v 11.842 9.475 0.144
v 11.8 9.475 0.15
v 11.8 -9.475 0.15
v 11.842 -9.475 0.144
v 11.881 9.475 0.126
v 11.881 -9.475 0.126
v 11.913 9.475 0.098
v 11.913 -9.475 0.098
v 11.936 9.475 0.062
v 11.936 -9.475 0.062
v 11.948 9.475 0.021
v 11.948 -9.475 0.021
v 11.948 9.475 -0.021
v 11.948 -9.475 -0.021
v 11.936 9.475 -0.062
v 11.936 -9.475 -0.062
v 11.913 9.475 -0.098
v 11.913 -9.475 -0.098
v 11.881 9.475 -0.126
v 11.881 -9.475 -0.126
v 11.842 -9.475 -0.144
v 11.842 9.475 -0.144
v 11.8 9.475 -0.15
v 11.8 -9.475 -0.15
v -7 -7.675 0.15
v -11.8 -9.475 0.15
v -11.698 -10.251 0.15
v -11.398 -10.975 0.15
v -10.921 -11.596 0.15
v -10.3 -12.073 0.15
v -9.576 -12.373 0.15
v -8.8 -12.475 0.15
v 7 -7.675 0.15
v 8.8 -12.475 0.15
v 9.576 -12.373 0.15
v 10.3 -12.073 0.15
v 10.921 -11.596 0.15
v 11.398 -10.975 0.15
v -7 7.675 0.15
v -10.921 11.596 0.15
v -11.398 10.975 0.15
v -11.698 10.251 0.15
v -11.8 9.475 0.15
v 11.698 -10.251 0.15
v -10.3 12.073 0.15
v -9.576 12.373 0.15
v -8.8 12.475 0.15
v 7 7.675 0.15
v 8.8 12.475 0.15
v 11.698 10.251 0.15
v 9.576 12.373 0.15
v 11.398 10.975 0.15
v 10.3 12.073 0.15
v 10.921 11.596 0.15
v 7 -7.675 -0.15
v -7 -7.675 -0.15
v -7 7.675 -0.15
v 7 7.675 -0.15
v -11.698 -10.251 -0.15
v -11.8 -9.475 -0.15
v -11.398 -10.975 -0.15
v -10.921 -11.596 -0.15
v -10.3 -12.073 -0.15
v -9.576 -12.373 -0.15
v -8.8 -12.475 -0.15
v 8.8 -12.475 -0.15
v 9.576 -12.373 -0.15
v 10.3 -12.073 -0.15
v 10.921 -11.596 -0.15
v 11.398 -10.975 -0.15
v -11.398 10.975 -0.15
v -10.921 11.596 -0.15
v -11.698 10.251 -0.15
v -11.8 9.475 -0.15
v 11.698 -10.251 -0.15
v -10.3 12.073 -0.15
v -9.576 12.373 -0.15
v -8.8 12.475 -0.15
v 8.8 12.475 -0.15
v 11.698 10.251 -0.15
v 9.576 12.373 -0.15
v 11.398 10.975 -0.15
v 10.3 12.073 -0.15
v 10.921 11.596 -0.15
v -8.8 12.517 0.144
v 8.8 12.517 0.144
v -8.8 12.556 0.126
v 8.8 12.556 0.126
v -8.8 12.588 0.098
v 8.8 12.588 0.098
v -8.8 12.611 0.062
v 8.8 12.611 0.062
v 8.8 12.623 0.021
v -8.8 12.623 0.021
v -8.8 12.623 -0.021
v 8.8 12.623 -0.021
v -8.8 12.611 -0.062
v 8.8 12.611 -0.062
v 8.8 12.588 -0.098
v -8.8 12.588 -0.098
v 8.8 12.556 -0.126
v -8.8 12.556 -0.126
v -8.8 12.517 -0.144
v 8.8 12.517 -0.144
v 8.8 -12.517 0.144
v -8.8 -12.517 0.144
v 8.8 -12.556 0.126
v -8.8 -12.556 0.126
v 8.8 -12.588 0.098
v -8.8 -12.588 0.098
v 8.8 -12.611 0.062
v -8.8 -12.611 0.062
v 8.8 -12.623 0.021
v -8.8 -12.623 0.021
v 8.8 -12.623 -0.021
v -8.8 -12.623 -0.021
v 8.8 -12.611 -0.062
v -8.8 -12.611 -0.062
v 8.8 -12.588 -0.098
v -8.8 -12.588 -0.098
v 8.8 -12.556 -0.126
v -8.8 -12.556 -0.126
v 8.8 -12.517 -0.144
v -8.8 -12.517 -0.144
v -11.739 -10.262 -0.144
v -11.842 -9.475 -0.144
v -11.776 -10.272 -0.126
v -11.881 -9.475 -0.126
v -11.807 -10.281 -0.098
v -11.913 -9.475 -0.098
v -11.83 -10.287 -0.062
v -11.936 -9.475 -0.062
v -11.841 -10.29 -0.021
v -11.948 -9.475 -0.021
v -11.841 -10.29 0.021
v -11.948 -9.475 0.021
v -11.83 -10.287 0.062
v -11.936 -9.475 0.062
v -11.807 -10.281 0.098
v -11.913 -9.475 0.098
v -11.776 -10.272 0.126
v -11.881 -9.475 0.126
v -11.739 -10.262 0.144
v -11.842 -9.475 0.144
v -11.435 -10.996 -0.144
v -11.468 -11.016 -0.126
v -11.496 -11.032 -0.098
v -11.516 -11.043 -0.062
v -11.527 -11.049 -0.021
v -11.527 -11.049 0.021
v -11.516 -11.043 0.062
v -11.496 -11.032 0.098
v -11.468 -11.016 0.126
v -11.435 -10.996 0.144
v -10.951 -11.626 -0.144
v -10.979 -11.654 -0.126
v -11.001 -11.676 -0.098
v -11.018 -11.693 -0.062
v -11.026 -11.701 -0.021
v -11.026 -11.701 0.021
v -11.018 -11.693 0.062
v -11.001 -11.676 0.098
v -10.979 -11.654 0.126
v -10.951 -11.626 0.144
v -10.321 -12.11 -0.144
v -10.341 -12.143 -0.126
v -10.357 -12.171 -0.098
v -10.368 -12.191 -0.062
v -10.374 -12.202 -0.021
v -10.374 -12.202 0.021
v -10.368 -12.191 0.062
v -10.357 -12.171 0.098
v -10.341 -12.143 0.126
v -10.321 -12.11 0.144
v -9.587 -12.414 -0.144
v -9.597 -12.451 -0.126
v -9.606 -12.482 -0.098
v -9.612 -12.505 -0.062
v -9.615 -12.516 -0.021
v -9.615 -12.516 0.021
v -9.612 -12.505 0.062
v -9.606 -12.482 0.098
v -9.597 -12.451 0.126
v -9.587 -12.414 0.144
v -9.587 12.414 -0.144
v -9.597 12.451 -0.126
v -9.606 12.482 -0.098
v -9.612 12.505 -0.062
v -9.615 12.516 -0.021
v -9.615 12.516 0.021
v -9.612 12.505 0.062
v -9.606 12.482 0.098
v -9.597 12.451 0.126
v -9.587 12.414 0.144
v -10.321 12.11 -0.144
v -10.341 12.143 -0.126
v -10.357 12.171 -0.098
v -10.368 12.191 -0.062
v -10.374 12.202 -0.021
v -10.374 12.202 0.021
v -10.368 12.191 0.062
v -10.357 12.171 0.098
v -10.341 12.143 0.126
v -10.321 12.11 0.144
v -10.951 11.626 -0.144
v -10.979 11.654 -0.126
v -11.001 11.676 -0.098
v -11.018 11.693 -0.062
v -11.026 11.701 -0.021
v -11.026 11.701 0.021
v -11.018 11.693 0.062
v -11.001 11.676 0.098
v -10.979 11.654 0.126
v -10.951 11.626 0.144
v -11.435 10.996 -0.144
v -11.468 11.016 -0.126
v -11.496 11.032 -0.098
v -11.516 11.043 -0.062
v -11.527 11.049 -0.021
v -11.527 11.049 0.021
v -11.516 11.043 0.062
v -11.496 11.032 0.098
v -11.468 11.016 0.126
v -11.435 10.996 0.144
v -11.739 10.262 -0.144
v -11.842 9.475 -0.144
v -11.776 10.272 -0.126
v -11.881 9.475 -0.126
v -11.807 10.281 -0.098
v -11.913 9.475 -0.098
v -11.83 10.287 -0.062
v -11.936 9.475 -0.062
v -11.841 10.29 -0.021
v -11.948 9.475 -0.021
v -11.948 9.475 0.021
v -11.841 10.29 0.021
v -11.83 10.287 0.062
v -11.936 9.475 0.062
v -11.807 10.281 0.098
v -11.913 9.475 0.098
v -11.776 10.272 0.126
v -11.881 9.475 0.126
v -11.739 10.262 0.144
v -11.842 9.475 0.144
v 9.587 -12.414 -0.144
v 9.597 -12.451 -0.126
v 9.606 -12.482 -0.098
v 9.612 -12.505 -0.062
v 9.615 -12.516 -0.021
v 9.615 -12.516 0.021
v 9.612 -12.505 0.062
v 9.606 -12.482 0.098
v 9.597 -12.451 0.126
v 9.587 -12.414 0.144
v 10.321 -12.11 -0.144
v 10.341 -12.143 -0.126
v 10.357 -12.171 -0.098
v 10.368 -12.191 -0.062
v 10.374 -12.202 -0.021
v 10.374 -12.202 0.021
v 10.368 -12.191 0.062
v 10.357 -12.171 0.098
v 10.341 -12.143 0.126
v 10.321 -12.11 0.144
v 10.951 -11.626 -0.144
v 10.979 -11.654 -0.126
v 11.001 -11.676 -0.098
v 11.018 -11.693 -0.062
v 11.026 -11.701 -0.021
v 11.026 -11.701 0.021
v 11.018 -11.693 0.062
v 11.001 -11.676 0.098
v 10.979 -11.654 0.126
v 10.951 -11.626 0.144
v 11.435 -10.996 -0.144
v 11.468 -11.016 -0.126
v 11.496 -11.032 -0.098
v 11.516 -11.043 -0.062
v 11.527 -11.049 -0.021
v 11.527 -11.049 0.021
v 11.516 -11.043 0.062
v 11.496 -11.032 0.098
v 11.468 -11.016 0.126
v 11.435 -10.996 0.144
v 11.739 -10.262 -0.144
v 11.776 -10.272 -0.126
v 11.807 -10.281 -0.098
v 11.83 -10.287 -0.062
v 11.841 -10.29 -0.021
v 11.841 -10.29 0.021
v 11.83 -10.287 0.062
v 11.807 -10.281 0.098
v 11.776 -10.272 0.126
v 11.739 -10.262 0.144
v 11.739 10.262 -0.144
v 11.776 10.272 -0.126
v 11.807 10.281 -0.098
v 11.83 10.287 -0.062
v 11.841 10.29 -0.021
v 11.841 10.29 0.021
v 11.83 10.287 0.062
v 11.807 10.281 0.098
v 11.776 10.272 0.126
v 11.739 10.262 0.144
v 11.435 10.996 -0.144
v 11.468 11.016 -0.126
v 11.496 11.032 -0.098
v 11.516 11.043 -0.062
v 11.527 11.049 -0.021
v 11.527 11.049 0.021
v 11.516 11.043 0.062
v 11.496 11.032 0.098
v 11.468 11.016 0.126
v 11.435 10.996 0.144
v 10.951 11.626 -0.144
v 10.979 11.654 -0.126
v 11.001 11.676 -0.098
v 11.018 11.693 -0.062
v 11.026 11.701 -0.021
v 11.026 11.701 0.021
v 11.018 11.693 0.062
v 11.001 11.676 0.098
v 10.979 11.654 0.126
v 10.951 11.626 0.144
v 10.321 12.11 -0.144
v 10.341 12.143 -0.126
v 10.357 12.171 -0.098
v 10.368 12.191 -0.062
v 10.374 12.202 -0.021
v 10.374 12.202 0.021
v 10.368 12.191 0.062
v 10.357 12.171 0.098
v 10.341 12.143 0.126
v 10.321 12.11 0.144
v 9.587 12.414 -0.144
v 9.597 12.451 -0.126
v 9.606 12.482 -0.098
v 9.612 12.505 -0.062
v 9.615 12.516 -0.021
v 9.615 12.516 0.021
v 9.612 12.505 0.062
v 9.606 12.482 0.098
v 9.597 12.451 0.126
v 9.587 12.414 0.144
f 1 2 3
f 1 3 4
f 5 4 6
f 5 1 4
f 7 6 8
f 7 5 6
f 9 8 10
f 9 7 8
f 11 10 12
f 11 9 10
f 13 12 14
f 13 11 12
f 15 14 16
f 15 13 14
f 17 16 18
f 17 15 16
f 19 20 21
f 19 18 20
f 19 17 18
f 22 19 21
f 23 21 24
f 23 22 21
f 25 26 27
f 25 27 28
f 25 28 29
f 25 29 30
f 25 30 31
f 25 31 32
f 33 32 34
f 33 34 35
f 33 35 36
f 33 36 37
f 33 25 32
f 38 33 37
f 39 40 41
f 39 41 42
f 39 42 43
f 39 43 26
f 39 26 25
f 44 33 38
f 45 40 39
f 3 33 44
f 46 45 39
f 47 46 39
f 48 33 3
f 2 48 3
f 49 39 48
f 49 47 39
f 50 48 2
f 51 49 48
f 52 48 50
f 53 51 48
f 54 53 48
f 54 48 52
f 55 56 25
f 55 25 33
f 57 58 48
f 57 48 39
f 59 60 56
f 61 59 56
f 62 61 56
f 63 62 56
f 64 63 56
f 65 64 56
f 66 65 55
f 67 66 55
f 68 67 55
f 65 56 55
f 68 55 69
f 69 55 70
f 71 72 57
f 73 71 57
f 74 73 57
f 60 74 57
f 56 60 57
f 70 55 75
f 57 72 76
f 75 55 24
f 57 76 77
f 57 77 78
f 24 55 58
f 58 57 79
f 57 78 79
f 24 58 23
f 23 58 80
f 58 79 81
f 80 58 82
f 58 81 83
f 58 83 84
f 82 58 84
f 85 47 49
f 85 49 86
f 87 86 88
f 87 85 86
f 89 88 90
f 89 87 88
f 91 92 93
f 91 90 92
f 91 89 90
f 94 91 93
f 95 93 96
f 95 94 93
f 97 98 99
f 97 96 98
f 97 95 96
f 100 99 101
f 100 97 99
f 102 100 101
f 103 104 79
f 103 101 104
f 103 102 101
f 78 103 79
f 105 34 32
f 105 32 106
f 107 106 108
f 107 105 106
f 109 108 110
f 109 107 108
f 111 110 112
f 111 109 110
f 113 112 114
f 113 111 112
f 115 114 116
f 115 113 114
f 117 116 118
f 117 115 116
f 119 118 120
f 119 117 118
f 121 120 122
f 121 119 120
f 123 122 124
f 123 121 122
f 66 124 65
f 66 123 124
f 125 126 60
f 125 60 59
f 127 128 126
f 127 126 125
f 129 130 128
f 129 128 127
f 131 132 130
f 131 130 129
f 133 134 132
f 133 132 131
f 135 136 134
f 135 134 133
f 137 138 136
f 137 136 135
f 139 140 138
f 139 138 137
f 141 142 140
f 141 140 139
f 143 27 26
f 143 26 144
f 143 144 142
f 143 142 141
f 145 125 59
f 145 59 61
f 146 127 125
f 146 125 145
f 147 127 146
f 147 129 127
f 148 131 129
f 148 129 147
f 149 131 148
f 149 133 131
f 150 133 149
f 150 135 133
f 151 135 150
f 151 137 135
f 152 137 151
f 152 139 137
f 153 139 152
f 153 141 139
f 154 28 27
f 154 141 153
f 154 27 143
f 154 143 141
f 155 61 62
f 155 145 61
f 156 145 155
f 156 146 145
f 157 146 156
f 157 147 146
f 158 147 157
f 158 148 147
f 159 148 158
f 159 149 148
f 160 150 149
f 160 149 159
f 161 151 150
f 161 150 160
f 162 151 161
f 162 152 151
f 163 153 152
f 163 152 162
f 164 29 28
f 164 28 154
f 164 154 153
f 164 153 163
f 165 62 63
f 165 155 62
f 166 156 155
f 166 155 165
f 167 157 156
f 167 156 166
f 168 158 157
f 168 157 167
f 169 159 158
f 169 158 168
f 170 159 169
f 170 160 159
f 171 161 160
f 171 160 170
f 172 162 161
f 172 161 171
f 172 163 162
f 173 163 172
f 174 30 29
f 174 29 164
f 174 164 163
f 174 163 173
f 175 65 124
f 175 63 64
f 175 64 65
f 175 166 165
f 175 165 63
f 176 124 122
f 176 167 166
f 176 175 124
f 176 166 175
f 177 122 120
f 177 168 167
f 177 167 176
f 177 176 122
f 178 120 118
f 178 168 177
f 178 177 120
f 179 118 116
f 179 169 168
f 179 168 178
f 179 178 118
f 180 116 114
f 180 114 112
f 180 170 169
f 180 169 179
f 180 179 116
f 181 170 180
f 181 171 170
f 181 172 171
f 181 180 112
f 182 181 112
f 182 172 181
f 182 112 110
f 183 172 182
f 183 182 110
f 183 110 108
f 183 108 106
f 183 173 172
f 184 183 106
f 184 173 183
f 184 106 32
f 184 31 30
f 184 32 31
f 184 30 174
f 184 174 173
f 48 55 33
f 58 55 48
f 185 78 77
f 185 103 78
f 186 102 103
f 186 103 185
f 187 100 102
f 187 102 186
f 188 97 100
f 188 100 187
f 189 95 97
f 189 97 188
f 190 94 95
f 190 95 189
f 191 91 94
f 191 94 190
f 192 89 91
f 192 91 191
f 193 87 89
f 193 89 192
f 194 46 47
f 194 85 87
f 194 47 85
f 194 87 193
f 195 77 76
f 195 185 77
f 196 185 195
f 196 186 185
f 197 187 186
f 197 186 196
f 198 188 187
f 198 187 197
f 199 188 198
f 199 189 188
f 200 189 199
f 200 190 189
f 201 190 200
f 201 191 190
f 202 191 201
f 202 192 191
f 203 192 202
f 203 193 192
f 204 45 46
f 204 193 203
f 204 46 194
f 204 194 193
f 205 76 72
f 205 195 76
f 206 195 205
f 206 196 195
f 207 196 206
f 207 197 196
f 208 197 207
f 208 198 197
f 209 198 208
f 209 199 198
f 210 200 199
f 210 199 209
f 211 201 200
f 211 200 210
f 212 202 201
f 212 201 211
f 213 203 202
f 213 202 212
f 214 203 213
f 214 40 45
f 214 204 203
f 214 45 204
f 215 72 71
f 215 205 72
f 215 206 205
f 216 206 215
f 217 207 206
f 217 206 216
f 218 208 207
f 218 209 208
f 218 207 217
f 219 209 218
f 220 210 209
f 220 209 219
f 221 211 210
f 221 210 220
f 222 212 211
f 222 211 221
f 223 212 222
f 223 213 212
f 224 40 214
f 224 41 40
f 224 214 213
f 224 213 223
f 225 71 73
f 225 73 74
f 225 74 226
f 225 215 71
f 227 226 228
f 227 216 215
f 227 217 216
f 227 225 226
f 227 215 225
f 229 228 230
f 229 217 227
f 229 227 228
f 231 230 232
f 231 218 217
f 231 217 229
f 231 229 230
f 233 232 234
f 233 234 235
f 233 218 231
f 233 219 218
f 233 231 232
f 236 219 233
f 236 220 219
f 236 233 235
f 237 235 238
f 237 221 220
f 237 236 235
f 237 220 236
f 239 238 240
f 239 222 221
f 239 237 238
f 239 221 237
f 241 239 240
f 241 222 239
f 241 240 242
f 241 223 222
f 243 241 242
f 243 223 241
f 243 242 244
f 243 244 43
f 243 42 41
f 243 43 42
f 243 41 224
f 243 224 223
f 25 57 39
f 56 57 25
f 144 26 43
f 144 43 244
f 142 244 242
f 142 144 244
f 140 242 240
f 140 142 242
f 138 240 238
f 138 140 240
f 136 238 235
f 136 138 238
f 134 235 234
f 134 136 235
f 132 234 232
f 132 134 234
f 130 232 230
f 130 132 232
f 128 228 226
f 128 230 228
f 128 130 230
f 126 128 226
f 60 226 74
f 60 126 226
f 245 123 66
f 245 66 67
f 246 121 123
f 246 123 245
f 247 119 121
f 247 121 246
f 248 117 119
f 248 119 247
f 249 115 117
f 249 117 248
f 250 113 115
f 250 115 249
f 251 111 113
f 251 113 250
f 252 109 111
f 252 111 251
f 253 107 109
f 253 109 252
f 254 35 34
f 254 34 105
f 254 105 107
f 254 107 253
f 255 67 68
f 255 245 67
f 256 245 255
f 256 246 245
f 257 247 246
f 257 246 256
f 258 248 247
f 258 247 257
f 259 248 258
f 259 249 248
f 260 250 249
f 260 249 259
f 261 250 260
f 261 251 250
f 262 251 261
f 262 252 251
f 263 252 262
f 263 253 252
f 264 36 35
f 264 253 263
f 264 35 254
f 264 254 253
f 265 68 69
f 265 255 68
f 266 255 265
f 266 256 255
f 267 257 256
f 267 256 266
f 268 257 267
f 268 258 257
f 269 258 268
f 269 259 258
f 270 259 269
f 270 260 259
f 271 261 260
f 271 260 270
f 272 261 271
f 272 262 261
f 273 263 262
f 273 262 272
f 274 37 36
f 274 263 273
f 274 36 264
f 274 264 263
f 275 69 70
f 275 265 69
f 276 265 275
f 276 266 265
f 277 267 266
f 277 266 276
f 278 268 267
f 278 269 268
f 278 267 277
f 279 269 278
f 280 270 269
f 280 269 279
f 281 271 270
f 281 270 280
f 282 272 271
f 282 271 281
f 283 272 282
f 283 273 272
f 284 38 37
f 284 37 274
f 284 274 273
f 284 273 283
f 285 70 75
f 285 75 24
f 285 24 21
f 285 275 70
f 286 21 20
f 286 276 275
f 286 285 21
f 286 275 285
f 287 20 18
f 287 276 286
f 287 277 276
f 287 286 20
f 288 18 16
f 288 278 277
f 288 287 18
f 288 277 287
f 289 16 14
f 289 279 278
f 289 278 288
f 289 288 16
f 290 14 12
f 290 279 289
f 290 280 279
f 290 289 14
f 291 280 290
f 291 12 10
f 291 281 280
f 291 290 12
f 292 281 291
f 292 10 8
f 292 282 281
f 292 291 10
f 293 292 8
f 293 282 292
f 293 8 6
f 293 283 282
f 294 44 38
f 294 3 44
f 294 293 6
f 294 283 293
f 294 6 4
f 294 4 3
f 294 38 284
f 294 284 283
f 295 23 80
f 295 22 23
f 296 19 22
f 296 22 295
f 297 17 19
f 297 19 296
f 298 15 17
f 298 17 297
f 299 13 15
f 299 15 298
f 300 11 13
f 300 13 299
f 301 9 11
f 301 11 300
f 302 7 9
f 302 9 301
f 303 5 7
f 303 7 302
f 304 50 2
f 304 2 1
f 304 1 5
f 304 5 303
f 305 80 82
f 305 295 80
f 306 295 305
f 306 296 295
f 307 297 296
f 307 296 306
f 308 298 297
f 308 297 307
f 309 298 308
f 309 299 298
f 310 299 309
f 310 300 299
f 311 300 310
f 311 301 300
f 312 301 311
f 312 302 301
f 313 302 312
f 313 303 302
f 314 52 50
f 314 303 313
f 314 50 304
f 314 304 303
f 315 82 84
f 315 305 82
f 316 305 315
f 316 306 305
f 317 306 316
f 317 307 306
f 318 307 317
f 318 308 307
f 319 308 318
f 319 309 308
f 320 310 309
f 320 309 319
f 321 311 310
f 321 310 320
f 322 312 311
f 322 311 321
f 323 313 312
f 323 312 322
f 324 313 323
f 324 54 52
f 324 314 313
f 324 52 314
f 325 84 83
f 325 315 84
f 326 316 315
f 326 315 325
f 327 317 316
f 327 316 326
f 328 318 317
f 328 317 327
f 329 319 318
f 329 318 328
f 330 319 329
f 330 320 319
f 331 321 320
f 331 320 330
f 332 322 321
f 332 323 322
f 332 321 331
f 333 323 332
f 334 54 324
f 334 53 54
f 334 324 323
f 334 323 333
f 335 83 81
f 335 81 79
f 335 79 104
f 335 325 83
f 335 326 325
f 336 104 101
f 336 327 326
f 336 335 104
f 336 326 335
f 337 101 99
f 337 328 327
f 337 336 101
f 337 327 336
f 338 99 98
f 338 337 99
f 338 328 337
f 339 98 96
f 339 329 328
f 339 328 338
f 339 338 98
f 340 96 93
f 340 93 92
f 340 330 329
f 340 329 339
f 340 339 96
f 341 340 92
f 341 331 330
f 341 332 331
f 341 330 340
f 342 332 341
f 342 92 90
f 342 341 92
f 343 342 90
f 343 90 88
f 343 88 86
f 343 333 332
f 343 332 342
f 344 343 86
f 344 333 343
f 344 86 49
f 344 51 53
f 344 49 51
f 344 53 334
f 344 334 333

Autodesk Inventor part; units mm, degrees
ref_plane "YZ Plane" through (0, 0, 0) normal (1, 0, 0) x (0, 1, 0)
ref_plane "XZ Plane" through (0, 0, 0) normal (0, 1, 0) x (-1, 0, 0)
ref_plane "XY Plane" through (0, 0, 0) normal (0, 0, 1) x (1, 0, 0)
sketch "Sketch1" plane through (0, 0, 0) normal (0, 0, 1) x (1, 0, 0)
  line L0 (-6.5, 7.175) -> (6.5, 7.175)
  line L1 (6.5, 7.175) -> (6.5, -7.175)
  line L2 (6.5, -7.175) -> (-6.5, -7.175)
  line L3 (-6.5, -7.175) -> (-6.5, 7.175)
  line L4 (8.8, 12.475) -> (-8.8, 12.475)
  line L5 (-11.8, 9.475) -> (-11.8, -9.475)
  line L6 (-8.8, -12.475) -> (8.8, -12.475)
  line L7 (11.8, -9.475) -> (11.8, 9.475)
  arc A0 (-8.8, 12.475) -> (-11.8, 9.475) centre (-8.8, 9.475) ccw
  arc A1 (11.8, 9.475) -> (8.8, 12.475) centre (8.8, 9.475) ccw
  arc A2 (8.8, -12.475) -> (11.8, -9.475) centre (8.8, -9.475) ccw
  arc A3 (-11.8, -9.475) -> (-8.8, -12.475) centre (-8.8, -9.475) ccw
  line L8 (7, 7.675) -> (-7, 7.675)
  line L9 (-7, 7.675) -> (-7, -7.675)
  line L10 (-7, -7.675) -> (7, -7.675)
  line L11 (7, -7.675) -> (7, 7.675)
  point P0 (0, 0)
  dimension "d0" = 13
  dimension "d1" = 14.35
  dimension "d3" = 3
  dimension "d4" = 7.175
  dimension "d5" = 6.5
  dimension "d11" = 0.5
  dimension "d12" = 24.95
  dimension "d13" = 23.6
sketch "Sketch2" plane through (0, 0, 0) normal (0, 1, 0) x (-1, 0, 0)
  circle A0 centre (-11.8, 0) radius 0.15
  point P0 (0, 0)
  dimension "d6" = 0.3
sweep "Sweep1" add profiles "Sketch2" path "Sketch1" path curves L5 A0 L4 A1 L7 A2 L6 A3
extrude "Extrusion1" add sketch "Sketch1" along normal mid plane 0.3 contours A1 L7 A2 L6 A3 L5 A0 L4
equation "\"d4\" = 0.5 * d1"
equation "\"d5\" = 0.5 * d0"
properties part number "COTS_GENERIC_Transformer_Electromagnet_Coil_Layer" material "Copper"
